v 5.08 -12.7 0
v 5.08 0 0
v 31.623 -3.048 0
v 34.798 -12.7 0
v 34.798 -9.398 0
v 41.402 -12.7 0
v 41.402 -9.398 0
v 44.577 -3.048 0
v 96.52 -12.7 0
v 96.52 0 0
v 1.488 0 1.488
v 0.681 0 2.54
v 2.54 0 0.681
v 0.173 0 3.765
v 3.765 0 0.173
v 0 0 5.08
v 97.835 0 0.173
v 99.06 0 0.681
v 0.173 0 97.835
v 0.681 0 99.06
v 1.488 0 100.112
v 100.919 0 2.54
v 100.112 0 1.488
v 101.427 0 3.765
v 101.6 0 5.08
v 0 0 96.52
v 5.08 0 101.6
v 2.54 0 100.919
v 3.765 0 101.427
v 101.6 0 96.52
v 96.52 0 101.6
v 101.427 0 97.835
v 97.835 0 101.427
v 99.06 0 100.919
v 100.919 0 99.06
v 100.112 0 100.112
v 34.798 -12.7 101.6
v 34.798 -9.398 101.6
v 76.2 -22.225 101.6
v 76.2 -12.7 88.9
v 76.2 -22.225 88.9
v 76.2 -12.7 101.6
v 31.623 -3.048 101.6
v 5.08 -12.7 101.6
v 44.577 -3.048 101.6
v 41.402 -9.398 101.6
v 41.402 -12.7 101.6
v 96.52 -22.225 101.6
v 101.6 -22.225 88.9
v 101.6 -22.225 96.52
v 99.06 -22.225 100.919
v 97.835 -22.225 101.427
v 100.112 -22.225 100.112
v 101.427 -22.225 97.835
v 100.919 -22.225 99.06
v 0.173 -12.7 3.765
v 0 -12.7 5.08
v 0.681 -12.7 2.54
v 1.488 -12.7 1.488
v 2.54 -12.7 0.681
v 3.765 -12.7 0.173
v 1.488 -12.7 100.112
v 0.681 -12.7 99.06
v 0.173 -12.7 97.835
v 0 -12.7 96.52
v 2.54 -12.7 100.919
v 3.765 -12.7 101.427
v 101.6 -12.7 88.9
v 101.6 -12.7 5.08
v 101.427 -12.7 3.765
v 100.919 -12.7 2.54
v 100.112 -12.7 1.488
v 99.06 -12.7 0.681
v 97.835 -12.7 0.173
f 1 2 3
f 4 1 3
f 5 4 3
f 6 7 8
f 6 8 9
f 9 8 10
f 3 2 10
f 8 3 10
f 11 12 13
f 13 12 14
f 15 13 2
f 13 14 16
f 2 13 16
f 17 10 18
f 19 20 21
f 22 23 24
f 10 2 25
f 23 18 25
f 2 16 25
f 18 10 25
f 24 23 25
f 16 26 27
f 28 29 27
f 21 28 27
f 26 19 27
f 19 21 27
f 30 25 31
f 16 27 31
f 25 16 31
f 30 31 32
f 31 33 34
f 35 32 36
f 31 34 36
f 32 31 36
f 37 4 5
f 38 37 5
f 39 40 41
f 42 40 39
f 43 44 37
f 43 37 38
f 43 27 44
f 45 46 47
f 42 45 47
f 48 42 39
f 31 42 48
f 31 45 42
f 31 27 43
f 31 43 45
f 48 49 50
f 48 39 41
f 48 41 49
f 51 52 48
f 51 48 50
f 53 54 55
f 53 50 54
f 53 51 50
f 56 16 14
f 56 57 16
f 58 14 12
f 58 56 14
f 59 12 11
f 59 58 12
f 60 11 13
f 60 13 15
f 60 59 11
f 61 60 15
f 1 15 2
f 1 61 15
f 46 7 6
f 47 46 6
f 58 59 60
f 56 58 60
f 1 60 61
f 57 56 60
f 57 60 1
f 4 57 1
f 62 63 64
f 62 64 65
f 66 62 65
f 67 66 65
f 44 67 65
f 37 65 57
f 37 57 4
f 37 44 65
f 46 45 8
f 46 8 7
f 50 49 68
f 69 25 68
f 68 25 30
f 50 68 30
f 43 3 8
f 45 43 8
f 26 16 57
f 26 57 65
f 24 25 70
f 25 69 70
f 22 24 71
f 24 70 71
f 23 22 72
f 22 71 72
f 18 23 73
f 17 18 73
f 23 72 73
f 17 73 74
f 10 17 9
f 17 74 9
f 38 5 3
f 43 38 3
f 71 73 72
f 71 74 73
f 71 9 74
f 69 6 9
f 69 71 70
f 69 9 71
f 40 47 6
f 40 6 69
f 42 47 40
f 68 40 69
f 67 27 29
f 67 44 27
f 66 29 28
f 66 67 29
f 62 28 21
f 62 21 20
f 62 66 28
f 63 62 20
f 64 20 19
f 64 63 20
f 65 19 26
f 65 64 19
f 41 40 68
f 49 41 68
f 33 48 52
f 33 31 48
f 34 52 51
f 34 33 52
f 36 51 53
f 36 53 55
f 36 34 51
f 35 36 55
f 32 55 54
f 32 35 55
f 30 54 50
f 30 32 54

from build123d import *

# Parameters (mm, degrees)
F0_W     = 101.6
F0_H     = 101.6
F1_DEPTH = 12.7
F2_W     = 25.4
F2_H     = 12.7
F3_DEPTH = 9.525
F5_DEPTH = 101.601
F6_R     = 5.08


with BuildPart() as f1:
    # F0 (on Front) → F1 (new body)
    with BuildSketch(Plane.XZ):
        with Locations((50.8, 50.8)):
            Rectangle(F0_W, F0_H)
    extrude(amount=F1_DEPTH)

    # F2 (on face) → F3 (join)
    with BuildSketch(Plane.XZ.offset(12.7)):
        with Locations((88.9, 95.25)):
            Rectangle(F2_W, F2_H)
    extrude(amount=F3_DEPTH)

    # F4 (on face) → F5 (cut, through all)
    with BuildSketch(Plane(origin=(0, 0, 0), x_dir=(1, 0, 0), z_dir=(0, 0, -1))):
        Polygon((41.402, 12.7), (38.1, 12.7), (38.1, 3.048), (44.577, 3.048), (41.402, 9.398), align=None)
        Polygon((38.1, 3.048), (38.1, 12.7), (34.798, 12.7), (34.798, 9.398), (31.623, 3.048), align=None)
    extrude(amount=-F5_DEPTH, mode=Mode.SUBTRACT)

    # F6
    f6_edges = [f1.edges().sort_by_distance(p)[0] for p in [
        (0, -6.35, 101.6),
        (0, -6.35, 0),
        (101.6, -6.35, 0),
        (101.6, -11.1125, 101.6),
    ]]
    fillet(f6_edges, radius=F6_R)


solid = f1.part
